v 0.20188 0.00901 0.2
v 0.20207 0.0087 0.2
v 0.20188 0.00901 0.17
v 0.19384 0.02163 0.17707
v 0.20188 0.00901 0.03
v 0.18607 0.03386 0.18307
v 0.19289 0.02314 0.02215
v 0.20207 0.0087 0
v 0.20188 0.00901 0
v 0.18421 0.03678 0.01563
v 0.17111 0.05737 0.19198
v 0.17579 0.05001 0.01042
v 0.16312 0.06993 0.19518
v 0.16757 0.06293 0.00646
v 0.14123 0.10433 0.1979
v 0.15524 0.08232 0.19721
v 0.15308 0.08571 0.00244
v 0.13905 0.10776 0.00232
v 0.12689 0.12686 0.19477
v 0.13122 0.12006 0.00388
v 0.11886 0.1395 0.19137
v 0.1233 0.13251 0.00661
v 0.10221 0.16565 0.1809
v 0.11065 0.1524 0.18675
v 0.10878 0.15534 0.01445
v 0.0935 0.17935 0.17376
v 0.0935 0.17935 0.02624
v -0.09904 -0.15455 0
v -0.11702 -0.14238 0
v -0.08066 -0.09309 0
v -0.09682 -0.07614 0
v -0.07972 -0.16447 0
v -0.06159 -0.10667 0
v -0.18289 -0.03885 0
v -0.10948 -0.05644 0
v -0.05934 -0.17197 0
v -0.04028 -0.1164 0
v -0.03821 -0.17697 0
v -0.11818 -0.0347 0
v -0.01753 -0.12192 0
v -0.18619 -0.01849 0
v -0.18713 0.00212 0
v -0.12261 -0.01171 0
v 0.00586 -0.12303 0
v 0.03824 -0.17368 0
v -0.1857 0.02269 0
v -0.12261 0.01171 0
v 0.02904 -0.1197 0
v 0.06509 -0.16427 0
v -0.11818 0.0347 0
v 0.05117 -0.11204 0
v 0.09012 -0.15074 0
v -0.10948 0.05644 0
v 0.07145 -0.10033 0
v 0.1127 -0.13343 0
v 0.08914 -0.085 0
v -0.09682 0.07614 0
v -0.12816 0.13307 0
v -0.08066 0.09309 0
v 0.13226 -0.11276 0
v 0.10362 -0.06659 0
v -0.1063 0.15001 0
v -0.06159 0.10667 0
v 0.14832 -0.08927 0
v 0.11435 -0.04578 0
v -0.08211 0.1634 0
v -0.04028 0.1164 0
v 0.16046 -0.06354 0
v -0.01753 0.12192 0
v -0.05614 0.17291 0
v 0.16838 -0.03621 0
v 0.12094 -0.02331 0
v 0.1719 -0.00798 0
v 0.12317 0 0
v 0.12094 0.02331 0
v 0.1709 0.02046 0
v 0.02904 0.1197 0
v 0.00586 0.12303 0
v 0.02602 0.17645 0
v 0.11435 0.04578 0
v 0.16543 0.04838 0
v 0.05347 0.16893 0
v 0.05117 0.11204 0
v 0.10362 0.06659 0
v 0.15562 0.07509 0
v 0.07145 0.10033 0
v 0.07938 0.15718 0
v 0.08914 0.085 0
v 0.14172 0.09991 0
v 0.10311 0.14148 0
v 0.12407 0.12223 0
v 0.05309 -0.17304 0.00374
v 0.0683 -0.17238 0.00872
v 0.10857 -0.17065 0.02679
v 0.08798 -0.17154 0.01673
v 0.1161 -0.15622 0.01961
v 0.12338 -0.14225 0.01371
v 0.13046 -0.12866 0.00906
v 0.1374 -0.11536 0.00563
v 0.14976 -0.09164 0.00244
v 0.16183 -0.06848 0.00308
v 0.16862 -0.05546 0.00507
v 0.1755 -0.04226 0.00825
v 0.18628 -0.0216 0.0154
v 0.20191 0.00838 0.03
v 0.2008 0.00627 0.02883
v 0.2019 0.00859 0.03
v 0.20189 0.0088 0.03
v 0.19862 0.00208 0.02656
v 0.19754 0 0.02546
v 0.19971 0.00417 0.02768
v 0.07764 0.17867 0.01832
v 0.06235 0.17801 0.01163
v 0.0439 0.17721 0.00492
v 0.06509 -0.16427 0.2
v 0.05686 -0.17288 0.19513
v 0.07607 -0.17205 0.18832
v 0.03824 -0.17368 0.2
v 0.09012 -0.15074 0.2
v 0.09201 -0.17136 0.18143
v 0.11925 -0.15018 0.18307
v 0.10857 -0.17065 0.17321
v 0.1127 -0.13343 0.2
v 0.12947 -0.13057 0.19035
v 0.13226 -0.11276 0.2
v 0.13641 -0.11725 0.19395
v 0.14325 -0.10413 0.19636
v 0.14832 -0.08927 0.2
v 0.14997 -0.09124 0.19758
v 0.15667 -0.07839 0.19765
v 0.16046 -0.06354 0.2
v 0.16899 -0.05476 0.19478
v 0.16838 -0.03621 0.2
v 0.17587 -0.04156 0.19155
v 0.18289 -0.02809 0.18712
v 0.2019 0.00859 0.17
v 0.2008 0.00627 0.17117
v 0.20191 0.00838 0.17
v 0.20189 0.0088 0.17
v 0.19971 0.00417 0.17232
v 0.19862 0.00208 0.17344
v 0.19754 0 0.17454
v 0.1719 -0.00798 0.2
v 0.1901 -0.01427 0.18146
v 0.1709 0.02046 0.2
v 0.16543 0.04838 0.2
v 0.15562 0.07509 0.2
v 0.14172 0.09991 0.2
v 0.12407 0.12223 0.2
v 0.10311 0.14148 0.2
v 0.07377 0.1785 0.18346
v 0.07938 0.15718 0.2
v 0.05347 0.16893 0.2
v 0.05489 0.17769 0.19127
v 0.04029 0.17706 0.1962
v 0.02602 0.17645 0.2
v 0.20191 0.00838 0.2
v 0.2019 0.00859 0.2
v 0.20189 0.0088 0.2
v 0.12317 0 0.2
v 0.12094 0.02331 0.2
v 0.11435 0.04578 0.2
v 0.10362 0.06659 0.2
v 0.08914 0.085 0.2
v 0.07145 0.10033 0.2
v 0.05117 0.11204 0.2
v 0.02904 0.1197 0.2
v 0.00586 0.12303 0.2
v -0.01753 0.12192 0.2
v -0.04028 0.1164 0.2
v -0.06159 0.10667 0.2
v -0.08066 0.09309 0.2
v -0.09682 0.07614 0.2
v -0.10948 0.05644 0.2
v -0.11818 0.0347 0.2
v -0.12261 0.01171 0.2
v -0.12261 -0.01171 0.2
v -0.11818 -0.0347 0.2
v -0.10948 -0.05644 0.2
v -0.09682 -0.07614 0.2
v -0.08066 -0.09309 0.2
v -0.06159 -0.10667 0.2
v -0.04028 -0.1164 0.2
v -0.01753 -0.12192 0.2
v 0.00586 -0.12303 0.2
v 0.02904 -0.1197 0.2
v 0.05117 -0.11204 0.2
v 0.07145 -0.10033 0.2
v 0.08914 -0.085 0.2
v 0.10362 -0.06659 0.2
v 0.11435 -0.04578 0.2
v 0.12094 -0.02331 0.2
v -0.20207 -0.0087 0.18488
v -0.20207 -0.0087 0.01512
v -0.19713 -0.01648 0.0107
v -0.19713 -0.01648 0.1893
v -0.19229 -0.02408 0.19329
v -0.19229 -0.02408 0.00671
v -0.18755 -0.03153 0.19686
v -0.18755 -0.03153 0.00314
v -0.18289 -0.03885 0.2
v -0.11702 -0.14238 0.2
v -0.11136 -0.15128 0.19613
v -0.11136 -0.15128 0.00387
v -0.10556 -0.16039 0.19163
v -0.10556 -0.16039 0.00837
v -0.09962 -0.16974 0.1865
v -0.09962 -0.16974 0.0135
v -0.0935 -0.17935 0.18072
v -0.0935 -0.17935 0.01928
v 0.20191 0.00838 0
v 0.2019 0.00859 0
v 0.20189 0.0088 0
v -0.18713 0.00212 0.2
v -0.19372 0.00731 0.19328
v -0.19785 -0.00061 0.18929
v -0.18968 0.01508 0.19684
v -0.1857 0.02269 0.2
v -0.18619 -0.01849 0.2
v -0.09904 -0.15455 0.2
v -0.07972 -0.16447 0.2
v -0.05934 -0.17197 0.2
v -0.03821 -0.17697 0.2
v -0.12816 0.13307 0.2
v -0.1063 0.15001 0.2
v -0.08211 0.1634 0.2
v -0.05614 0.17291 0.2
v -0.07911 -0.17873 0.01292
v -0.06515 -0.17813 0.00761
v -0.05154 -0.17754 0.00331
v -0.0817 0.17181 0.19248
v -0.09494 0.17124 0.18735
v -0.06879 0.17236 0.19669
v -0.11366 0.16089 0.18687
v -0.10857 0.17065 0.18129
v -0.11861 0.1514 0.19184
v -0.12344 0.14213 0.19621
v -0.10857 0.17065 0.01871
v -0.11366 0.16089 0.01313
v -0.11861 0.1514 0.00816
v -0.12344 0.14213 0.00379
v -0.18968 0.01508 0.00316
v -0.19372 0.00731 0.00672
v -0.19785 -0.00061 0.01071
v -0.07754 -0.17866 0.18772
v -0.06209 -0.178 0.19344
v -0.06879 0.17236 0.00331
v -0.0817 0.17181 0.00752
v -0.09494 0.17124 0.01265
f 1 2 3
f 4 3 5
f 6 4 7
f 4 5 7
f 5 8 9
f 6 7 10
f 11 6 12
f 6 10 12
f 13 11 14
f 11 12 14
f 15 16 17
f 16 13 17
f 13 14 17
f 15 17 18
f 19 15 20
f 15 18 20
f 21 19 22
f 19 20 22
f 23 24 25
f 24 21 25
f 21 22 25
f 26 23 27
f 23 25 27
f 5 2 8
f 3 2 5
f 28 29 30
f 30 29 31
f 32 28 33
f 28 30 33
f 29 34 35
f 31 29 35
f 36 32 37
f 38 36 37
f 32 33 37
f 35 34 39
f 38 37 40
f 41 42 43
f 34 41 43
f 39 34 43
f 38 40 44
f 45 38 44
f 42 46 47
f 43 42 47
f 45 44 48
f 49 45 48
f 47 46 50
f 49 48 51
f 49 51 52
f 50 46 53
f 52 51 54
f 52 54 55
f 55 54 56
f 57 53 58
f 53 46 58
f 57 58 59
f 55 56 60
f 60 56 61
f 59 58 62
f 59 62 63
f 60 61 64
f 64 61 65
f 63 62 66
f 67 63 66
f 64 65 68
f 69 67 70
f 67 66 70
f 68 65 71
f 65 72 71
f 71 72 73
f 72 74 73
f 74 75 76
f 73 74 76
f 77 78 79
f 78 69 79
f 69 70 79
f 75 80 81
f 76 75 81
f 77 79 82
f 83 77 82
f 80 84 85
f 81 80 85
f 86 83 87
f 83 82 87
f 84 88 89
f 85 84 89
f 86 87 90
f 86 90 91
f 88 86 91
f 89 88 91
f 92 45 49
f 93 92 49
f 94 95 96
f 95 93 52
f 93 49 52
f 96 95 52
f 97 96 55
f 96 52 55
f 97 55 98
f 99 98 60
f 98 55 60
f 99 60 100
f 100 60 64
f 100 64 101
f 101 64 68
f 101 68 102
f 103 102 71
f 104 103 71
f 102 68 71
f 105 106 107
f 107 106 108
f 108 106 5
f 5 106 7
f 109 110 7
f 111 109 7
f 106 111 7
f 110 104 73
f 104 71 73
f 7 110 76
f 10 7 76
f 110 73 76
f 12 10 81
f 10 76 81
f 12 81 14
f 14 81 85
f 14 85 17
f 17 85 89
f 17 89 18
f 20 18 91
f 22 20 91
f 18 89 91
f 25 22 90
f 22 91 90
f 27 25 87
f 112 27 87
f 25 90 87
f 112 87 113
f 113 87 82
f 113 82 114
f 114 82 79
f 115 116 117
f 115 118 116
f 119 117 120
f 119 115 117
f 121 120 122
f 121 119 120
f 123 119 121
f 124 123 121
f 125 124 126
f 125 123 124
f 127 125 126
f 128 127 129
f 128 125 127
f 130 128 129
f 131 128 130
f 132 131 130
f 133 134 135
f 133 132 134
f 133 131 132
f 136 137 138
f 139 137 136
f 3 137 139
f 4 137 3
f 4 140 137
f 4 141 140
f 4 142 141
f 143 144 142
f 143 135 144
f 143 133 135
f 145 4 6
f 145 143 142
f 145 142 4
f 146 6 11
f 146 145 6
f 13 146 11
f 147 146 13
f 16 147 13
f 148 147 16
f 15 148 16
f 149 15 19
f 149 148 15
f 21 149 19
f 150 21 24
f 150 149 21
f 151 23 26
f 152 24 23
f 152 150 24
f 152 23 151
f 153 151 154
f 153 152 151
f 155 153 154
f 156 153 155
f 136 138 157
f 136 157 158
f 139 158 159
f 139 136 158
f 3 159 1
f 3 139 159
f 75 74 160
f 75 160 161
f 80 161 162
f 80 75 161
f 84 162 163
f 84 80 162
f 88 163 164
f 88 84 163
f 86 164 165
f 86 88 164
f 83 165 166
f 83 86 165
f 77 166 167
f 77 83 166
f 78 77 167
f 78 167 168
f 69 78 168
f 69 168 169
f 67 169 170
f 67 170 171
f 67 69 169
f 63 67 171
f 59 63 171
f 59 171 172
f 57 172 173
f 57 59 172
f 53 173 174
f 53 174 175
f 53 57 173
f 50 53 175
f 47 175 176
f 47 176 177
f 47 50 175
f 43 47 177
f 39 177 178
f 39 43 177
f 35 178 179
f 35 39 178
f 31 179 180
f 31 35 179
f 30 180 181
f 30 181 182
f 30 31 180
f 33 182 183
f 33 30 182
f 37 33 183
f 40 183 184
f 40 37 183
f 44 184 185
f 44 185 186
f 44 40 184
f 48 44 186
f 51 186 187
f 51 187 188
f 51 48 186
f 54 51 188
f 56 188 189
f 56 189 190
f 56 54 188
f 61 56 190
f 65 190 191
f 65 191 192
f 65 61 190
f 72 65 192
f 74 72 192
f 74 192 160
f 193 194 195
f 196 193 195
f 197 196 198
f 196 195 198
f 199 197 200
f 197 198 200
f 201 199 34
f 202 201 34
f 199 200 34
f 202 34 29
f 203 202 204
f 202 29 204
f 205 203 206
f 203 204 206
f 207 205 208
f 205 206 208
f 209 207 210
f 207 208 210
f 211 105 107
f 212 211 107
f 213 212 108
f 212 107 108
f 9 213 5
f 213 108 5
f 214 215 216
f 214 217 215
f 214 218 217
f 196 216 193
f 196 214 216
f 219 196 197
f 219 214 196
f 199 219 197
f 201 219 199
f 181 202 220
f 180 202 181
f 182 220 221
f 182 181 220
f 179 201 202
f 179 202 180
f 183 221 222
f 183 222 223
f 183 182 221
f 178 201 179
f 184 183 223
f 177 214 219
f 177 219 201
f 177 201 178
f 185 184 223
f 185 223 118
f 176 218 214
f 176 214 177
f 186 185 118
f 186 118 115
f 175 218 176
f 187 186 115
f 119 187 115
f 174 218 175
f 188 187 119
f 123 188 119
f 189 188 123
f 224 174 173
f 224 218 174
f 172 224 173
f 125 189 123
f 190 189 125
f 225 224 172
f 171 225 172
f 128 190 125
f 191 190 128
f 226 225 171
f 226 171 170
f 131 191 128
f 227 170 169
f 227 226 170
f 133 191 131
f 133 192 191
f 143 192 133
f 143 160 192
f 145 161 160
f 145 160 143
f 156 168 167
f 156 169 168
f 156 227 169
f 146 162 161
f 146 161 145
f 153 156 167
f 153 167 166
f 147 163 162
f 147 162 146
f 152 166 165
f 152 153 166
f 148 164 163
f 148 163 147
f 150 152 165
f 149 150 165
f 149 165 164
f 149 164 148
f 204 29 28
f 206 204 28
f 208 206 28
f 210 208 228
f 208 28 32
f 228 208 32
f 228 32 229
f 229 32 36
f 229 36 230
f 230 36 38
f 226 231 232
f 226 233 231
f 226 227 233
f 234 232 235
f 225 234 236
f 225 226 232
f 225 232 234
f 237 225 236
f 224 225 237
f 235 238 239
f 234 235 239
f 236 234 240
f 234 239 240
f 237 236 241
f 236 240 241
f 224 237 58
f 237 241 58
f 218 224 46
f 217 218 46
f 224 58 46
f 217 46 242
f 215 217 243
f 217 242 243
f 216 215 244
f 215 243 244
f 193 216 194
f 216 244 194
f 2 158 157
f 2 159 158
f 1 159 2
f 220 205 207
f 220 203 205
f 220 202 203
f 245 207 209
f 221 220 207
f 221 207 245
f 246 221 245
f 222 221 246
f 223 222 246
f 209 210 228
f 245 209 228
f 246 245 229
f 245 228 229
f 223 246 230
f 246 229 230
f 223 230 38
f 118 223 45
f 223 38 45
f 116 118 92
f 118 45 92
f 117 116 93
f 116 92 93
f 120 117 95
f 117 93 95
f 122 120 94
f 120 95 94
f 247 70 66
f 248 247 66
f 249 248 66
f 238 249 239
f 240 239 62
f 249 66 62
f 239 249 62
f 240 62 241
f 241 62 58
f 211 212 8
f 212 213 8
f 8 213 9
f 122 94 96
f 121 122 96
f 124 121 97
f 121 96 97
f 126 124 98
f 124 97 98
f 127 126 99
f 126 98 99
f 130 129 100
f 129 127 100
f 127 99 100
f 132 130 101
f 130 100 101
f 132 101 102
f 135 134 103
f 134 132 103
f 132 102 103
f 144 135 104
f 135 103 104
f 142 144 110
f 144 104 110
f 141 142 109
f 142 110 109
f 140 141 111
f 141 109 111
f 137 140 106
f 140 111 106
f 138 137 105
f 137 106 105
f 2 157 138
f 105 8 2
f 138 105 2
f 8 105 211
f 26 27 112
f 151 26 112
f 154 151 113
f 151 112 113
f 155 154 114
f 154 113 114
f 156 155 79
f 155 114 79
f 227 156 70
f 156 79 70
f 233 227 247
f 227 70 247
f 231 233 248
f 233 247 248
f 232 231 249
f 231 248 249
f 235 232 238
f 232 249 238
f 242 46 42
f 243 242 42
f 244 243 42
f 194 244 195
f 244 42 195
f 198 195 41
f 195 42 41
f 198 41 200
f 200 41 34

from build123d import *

# Parameters (mm, degrees)
SKETCH1_R           = 0.123170065
BOSS_EXTRUDE2_DEPTH = 0.2


with BuildPart() as part:
    # Sketch1 → Boss-Extrude2 (new body)
    with BuildSketch(Plane.XY):
        Polygon((-0.10857217, 0.170649162), (-0.202072594, -0.008701676), (-0.093500424, -0.179350838), (0.10857217, -0.170649162), (0.202072594, 0.008701676), (0.093500424, 0.179350838), align=None)
        Circle(SKETCH1_R, mode=Mode.SUBTRACT)
    extrude(amount=BOSS_EXTRUDE2_DEPTH)

    # Sketch3 → Cut-Revolve2 (revolve, cut)
    with BuildSketch(Plane(origin=(0, 0, 0), x_dir=(1, 0, 0), z_dir=(0, 1, 0))):
        Polygon((0.172072594, 0), (0.202072594, 0), (0.202072594, -0.03), align=None)
        Polygon((0.202072594, -0.2), (0.202072594, -0.17), (0.172072594, -0.2), align=None)
    revolve(axis=Axis((-0.007535873, 0, 0), (0, 0, 1)), mode=Mode.SUBTRACT)


solid = part.part
